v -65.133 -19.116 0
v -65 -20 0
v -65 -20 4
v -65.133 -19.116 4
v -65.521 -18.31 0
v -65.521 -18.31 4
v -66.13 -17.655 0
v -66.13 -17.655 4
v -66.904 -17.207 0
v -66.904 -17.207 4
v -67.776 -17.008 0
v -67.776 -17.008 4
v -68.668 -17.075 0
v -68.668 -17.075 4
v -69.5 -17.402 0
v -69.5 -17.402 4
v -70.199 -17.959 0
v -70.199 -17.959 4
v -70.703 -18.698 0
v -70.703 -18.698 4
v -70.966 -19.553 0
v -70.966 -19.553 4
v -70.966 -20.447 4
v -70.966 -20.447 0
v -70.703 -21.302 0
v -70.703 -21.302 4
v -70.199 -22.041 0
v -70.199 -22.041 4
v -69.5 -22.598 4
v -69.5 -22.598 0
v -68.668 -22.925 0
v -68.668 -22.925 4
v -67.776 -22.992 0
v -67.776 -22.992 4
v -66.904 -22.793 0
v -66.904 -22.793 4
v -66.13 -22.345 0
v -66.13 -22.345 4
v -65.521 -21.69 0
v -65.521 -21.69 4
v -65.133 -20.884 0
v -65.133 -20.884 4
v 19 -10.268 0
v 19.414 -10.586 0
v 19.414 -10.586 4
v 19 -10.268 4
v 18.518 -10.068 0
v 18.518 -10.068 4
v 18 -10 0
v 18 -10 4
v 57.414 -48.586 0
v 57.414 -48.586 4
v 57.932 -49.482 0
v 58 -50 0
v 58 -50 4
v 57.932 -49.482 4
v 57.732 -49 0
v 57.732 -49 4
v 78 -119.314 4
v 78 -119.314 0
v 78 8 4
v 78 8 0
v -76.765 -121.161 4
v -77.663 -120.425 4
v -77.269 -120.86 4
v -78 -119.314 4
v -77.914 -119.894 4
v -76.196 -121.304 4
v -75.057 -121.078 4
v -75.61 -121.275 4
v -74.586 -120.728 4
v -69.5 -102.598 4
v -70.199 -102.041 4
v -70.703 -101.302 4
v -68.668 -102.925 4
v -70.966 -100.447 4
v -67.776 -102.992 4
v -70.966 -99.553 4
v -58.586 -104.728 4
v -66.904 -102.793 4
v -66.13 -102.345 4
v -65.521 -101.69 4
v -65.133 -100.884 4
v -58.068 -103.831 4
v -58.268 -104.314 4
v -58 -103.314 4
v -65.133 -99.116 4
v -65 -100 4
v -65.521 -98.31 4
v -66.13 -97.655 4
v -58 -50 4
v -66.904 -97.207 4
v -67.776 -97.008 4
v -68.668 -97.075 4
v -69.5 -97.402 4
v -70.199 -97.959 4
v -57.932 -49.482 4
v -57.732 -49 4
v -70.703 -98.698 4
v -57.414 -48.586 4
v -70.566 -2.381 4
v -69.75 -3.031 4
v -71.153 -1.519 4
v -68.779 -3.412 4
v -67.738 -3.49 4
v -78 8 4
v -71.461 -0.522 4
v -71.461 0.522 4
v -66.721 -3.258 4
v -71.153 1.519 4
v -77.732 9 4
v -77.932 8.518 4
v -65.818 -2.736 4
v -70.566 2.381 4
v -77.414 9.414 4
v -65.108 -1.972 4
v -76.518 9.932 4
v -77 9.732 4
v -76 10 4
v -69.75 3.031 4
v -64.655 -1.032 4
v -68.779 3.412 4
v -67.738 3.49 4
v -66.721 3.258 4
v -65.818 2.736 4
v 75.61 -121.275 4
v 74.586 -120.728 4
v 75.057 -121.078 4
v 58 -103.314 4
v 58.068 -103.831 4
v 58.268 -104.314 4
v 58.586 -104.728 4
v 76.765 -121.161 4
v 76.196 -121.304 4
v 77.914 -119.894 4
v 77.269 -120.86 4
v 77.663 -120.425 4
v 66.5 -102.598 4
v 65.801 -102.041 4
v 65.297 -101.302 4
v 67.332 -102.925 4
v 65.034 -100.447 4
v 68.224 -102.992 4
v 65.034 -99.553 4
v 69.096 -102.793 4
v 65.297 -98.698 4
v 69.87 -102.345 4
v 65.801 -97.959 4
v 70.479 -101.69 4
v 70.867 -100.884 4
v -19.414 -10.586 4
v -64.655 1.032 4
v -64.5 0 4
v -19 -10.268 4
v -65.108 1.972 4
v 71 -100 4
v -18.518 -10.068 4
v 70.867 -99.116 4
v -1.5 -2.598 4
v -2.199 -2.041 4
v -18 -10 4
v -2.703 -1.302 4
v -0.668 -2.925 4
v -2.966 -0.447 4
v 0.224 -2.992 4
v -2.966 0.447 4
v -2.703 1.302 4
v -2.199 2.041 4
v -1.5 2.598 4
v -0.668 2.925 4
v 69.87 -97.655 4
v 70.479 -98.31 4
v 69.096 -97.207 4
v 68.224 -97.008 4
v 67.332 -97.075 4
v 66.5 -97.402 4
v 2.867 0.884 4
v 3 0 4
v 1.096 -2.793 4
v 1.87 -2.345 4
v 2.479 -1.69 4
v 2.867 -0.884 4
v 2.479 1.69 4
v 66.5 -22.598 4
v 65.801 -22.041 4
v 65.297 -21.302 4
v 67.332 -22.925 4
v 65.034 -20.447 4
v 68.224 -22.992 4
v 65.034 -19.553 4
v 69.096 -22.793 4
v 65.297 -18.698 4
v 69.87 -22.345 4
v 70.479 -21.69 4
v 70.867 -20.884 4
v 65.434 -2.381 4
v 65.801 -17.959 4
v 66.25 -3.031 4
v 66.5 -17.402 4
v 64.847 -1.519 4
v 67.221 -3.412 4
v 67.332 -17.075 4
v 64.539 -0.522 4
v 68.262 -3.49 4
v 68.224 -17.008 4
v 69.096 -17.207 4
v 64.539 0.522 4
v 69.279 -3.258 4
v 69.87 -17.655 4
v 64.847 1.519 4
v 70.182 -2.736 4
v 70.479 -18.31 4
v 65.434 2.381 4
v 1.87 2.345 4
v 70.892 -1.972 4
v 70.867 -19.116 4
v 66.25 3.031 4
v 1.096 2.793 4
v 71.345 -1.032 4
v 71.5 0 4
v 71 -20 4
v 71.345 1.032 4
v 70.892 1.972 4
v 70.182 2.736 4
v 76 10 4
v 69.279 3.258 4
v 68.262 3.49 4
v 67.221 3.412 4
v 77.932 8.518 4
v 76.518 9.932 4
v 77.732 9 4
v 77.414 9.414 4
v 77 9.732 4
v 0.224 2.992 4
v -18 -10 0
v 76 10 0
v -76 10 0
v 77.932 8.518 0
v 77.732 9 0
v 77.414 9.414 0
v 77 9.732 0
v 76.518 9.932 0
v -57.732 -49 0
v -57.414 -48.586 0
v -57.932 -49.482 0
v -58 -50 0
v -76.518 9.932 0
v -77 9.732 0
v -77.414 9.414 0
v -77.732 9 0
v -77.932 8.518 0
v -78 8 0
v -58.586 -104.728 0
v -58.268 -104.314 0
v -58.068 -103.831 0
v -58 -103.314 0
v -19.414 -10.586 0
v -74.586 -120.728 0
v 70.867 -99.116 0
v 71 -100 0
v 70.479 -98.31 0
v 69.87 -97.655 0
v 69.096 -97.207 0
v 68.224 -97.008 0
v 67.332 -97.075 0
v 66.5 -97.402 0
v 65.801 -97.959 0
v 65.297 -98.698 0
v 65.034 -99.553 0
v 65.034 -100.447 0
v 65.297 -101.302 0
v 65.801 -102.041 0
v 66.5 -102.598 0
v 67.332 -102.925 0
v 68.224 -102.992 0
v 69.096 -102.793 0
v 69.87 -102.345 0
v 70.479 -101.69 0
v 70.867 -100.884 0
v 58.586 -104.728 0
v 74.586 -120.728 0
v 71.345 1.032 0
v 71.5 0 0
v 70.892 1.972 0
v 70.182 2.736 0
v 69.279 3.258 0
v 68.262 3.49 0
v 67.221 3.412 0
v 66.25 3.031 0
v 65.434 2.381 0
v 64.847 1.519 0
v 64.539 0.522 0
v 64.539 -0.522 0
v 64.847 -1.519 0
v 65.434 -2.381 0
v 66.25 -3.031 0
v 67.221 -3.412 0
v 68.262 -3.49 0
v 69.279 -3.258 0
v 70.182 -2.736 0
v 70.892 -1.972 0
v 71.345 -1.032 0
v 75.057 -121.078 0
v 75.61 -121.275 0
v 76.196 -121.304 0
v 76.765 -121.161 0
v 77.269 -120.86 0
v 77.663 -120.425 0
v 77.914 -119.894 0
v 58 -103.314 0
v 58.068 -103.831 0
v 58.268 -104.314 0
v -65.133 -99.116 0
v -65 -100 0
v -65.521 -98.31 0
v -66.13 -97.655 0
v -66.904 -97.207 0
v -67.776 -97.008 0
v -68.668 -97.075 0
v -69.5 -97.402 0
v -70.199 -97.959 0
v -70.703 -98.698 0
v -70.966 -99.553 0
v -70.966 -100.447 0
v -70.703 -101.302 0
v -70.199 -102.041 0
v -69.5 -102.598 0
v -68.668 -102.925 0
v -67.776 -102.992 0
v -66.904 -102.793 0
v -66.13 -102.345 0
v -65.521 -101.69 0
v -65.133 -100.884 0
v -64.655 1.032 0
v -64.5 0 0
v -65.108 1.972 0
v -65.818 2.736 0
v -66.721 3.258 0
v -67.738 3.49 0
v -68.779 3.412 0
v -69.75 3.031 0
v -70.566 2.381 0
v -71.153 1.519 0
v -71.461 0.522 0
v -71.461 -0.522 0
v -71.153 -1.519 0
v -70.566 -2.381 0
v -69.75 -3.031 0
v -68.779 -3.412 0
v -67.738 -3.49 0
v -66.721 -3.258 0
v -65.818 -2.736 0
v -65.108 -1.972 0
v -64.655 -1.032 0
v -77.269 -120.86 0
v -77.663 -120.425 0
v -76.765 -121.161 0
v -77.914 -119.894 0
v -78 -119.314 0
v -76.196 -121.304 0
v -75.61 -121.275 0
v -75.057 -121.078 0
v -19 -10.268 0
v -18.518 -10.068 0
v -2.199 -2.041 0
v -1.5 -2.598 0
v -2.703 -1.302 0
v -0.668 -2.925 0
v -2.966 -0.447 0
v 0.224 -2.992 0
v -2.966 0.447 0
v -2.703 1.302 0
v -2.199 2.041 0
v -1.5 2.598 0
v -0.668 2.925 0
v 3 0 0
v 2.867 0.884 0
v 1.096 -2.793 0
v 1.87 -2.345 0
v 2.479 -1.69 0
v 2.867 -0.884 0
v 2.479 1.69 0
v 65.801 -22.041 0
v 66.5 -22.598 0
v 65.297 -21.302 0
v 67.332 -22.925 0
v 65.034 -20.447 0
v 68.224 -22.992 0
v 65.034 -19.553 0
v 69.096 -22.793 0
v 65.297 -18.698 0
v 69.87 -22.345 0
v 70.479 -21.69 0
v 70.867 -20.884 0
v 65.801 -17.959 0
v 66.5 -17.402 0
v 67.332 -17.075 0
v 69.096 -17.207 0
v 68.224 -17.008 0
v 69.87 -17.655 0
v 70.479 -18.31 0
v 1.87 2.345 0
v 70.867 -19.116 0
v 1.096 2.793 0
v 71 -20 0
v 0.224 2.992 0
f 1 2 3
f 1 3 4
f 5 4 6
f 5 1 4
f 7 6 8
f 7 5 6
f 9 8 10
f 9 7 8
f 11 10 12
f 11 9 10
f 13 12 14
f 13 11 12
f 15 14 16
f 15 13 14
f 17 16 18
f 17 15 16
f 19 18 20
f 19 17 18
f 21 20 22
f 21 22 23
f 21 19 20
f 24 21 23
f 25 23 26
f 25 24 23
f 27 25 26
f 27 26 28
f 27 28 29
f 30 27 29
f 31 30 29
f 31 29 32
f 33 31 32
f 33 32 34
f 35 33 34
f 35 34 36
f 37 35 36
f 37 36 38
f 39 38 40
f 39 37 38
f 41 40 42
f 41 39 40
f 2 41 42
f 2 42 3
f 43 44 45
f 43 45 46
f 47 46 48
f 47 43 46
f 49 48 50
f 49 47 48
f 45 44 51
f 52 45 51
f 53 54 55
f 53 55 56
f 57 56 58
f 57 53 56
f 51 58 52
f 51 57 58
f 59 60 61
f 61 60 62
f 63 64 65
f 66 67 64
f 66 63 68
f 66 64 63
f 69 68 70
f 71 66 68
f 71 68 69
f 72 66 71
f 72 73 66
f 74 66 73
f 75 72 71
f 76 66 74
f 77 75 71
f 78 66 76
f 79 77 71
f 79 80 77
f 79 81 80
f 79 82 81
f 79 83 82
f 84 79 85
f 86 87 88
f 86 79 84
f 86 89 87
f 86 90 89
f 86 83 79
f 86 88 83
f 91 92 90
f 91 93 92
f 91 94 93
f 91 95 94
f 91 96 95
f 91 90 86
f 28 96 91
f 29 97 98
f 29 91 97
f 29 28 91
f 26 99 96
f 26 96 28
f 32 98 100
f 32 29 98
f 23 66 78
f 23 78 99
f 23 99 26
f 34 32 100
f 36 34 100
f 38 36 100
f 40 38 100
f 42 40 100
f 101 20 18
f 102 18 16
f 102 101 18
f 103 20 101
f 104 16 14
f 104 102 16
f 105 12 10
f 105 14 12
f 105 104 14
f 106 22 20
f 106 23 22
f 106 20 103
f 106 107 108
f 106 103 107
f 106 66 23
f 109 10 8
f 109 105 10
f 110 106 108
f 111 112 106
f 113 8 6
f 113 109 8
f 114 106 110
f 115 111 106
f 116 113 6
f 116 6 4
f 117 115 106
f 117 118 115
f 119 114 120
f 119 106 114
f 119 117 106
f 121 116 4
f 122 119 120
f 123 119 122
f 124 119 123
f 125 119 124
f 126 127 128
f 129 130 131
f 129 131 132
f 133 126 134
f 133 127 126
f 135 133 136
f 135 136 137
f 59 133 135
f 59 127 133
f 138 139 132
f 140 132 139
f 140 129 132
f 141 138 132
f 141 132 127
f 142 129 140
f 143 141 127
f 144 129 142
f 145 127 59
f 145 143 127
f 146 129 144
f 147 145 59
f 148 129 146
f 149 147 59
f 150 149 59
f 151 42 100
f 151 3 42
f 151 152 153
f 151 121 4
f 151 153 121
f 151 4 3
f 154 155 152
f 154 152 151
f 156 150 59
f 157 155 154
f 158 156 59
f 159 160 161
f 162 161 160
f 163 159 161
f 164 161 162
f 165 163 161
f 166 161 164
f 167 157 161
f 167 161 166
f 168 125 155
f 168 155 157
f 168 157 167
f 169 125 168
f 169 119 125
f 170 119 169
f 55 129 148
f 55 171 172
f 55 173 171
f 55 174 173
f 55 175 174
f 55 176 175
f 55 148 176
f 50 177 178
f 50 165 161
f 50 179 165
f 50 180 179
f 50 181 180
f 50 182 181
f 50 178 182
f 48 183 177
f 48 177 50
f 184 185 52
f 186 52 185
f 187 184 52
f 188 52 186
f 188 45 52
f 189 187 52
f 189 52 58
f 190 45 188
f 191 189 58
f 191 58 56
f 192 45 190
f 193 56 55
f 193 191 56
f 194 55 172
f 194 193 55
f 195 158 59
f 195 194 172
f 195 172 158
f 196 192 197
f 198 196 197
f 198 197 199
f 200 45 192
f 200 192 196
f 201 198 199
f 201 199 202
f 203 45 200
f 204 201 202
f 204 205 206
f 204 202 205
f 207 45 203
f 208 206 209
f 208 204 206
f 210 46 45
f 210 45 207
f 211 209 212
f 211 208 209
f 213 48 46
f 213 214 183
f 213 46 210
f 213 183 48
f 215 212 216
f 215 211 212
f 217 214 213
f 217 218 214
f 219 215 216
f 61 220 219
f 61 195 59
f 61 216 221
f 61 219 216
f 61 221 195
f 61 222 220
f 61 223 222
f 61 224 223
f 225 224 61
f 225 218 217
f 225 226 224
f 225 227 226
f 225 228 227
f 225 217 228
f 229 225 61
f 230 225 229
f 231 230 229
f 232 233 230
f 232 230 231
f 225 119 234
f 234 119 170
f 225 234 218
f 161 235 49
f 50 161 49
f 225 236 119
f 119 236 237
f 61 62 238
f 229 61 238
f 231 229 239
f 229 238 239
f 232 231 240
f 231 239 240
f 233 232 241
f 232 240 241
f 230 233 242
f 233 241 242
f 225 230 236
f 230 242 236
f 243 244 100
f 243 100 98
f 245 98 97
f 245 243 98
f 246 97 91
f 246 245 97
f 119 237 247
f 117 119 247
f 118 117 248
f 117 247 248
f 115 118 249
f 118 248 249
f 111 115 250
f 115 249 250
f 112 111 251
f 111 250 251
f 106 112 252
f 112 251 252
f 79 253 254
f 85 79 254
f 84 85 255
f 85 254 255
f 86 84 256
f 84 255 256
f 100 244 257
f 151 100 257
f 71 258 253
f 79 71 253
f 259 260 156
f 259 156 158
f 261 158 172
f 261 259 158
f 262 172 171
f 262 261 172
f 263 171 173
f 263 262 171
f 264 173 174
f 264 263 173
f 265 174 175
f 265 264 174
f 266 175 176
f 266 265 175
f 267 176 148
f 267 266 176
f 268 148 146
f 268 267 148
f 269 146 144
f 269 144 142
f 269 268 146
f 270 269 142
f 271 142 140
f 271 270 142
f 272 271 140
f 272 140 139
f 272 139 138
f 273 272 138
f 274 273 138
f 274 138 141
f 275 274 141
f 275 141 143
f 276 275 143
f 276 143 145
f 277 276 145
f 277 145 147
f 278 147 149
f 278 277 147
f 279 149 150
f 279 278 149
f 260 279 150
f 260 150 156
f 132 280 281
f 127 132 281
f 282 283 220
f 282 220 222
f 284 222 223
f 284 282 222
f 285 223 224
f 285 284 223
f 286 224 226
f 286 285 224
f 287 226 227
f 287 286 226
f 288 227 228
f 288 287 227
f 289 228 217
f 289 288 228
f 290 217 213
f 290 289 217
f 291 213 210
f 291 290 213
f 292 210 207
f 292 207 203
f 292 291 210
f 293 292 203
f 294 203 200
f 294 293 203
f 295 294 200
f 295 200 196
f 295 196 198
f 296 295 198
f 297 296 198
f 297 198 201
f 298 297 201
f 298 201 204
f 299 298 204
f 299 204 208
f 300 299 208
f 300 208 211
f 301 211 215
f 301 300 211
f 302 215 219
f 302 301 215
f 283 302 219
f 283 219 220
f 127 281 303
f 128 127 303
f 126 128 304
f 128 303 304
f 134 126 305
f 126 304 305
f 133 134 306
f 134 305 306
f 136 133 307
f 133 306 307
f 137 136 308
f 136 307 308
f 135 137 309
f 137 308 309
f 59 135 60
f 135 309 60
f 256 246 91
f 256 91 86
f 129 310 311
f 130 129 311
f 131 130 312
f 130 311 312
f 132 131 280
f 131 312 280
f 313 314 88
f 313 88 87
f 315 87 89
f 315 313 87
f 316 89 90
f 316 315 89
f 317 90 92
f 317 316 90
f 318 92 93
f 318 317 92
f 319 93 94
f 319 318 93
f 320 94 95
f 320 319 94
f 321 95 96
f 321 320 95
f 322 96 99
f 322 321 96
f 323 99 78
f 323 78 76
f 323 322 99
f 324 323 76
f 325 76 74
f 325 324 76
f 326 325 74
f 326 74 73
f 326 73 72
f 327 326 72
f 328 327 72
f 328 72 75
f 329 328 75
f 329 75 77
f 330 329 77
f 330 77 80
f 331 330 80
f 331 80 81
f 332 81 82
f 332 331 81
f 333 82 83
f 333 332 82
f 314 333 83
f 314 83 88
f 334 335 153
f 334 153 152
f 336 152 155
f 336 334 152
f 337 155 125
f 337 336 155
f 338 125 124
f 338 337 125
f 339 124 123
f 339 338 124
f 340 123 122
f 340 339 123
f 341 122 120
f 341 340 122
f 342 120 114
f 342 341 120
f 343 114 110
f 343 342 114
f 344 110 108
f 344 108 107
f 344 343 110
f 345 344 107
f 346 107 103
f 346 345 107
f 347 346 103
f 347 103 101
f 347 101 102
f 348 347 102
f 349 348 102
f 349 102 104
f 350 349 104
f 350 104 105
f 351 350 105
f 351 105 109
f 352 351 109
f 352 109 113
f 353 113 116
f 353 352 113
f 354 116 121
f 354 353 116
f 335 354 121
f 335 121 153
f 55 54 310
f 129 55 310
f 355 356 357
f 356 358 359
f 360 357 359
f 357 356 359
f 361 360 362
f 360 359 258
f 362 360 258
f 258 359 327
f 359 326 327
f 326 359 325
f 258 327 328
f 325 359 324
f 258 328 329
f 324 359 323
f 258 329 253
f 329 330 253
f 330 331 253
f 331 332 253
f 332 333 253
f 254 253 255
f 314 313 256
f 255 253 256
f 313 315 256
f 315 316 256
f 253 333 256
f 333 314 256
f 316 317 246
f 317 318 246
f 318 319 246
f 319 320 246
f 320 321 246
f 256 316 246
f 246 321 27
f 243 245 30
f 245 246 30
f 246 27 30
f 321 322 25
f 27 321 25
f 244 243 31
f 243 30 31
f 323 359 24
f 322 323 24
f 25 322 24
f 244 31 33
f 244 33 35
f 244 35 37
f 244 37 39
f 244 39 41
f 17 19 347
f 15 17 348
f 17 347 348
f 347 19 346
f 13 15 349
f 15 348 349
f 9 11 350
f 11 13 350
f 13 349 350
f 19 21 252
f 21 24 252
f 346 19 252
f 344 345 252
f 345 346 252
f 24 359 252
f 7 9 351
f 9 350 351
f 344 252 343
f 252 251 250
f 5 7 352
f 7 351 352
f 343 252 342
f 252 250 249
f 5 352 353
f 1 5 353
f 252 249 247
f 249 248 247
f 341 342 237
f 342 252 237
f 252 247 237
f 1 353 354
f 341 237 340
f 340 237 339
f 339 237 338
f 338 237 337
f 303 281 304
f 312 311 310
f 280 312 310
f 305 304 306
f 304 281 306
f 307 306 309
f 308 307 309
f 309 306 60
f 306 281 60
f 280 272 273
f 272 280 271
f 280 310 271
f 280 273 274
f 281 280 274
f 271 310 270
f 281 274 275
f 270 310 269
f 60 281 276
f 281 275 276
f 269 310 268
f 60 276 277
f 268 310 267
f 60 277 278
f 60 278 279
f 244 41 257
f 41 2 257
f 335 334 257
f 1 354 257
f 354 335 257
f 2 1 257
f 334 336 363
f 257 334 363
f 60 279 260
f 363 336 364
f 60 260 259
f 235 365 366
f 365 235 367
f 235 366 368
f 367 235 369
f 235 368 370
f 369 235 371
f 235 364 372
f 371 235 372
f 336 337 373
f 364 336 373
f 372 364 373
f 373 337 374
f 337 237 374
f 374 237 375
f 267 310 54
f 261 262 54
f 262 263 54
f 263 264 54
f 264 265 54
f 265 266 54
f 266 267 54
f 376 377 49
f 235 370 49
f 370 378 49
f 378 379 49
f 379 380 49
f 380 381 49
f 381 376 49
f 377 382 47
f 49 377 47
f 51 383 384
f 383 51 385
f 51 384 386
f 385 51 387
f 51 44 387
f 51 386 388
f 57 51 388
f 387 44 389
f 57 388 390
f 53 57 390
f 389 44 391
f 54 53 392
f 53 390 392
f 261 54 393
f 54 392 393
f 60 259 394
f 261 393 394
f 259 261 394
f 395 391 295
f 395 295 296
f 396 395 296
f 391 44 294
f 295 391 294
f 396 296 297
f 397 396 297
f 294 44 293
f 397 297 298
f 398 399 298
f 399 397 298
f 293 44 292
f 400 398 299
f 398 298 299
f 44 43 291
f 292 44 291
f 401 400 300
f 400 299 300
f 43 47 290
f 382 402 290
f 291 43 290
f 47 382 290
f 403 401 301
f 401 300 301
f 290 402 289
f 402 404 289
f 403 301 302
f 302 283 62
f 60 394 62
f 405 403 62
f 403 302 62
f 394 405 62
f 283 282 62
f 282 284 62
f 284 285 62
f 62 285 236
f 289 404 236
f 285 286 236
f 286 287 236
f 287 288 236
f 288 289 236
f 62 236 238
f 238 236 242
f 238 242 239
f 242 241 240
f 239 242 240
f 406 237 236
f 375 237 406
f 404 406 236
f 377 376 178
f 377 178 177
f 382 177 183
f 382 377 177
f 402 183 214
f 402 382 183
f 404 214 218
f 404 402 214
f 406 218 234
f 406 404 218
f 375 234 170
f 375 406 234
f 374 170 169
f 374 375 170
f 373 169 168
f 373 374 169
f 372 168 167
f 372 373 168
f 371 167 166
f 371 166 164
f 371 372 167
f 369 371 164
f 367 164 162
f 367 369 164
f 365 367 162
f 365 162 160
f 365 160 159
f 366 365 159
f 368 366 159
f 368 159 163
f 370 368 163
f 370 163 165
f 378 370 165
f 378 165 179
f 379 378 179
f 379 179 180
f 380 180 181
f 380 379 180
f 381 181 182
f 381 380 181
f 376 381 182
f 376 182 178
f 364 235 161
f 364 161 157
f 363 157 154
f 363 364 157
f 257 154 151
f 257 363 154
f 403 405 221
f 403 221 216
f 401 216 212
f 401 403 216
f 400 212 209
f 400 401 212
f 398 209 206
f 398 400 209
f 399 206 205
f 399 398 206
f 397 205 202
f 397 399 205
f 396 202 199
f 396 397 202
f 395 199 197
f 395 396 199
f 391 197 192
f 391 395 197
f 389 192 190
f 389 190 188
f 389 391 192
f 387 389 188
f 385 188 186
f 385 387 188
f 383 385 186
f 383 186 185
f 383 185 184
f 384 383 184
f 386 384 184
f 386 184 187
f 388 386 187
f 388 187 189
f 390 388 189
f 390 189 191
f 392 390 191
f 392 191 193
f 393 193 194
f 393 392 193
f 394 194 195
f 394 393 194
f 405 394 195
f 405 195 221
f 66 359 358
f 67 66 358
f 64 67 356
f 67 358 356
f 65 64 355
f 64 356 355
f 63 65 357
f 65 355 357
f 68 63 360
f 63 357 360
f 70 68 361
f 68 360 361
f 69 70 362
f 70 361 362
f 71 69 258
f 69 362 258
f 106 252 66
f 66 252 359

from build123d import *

# Parameters (mm, degrees)
SKETCH_R   = 3.5
SKETCH_R_2 = 3
PAD_DEPTH  = 4


with BuildPart() as part:
    # Sketch → Pad (new body)
    with BuildSketch(Plane.XY):
        with BuildLine():
            Line((-78, 8), (-78, -119.313708))
            ThreePointArc((-78, -119.313708), (-76.765367, -121.161468), (-74.585786, -120.727922))
            Line((-74.585786, -120.727922), (-58.585786, -104.727922))
            ThreePointArc((-58.585786, -104.727922), (-58.152241, -104.079075), (-58, -103.313708))
            Line((-58, -50), (-58, -103.313708))
            ThreePointArc((-57.414214, -48.585786), (-57.847759, -49.234633), (-58, -50))
            Line((-57.414214, -48.585786), (-19.414214, -10.585786))
            ThreePointArc((-18, -10), (-18.765367, -10.152241), (-19.414214, -10.585786))
            Line((-18, -10), (18, -10))
            ThreePointArc((19.414214, -10.585786), (18.765367, -10.152241), (18, -10))
            Line((19.414214, -10.585786), (57.414214, -48.585786))
            ThreePointArc((58, -50), (57.847759, -49.234633), (57.414214, -48.585786))
            Line((58, -50), (58, -103.313708))
            ThreePointArc((58, -103.313708), (58.152241, -104.079075), (58.585786, -104.727922))
            Line((58.585786, -104.727922), (74.585786, -120.727922))
            ThreePointArc((74.585786, -120.727922), (76.765367, -121.161468), (78, -119.313708))
            Line((78, -119.313708), (78, 8))
            ThreePointArc((78, 8), (77.414214, 9.414214), (76, 10))
            Line((76, 10), (-76, 10))
            ThreePointArc((-76, 10), (-77.414214, 9.414214), (-78, 8))
        make_face()
        with Locations((-68, 0)):
            Circle(SKETCH_R, mode=Mode.SUBTRACT)
        with Locations((68, 0)):
            Circle(SKETCH_R, mode=Mode.SUBTRACT)
        with Locations((-68, -20)):
            Circle(SKETCH_R_2, mode=Mode.SUBTRACT)
        with Locations((-68, -100)):
            Circle(SKETCH_R_2, mode=Mode.SUBTRACT)
        with Locations((68, -20)):
            Circle(SKETCH_R_2, mode=Mode.SUBTRACT)
        with Locations((68, -100)):
            Circle(SKETCH_R_2, mode=Mode.SUBTRACT)
        Circle(SKETCH_R_2, mode=Mode.SUBTRACT)
    extrude(amount=PAD_DEPTH)


solid = part.part
